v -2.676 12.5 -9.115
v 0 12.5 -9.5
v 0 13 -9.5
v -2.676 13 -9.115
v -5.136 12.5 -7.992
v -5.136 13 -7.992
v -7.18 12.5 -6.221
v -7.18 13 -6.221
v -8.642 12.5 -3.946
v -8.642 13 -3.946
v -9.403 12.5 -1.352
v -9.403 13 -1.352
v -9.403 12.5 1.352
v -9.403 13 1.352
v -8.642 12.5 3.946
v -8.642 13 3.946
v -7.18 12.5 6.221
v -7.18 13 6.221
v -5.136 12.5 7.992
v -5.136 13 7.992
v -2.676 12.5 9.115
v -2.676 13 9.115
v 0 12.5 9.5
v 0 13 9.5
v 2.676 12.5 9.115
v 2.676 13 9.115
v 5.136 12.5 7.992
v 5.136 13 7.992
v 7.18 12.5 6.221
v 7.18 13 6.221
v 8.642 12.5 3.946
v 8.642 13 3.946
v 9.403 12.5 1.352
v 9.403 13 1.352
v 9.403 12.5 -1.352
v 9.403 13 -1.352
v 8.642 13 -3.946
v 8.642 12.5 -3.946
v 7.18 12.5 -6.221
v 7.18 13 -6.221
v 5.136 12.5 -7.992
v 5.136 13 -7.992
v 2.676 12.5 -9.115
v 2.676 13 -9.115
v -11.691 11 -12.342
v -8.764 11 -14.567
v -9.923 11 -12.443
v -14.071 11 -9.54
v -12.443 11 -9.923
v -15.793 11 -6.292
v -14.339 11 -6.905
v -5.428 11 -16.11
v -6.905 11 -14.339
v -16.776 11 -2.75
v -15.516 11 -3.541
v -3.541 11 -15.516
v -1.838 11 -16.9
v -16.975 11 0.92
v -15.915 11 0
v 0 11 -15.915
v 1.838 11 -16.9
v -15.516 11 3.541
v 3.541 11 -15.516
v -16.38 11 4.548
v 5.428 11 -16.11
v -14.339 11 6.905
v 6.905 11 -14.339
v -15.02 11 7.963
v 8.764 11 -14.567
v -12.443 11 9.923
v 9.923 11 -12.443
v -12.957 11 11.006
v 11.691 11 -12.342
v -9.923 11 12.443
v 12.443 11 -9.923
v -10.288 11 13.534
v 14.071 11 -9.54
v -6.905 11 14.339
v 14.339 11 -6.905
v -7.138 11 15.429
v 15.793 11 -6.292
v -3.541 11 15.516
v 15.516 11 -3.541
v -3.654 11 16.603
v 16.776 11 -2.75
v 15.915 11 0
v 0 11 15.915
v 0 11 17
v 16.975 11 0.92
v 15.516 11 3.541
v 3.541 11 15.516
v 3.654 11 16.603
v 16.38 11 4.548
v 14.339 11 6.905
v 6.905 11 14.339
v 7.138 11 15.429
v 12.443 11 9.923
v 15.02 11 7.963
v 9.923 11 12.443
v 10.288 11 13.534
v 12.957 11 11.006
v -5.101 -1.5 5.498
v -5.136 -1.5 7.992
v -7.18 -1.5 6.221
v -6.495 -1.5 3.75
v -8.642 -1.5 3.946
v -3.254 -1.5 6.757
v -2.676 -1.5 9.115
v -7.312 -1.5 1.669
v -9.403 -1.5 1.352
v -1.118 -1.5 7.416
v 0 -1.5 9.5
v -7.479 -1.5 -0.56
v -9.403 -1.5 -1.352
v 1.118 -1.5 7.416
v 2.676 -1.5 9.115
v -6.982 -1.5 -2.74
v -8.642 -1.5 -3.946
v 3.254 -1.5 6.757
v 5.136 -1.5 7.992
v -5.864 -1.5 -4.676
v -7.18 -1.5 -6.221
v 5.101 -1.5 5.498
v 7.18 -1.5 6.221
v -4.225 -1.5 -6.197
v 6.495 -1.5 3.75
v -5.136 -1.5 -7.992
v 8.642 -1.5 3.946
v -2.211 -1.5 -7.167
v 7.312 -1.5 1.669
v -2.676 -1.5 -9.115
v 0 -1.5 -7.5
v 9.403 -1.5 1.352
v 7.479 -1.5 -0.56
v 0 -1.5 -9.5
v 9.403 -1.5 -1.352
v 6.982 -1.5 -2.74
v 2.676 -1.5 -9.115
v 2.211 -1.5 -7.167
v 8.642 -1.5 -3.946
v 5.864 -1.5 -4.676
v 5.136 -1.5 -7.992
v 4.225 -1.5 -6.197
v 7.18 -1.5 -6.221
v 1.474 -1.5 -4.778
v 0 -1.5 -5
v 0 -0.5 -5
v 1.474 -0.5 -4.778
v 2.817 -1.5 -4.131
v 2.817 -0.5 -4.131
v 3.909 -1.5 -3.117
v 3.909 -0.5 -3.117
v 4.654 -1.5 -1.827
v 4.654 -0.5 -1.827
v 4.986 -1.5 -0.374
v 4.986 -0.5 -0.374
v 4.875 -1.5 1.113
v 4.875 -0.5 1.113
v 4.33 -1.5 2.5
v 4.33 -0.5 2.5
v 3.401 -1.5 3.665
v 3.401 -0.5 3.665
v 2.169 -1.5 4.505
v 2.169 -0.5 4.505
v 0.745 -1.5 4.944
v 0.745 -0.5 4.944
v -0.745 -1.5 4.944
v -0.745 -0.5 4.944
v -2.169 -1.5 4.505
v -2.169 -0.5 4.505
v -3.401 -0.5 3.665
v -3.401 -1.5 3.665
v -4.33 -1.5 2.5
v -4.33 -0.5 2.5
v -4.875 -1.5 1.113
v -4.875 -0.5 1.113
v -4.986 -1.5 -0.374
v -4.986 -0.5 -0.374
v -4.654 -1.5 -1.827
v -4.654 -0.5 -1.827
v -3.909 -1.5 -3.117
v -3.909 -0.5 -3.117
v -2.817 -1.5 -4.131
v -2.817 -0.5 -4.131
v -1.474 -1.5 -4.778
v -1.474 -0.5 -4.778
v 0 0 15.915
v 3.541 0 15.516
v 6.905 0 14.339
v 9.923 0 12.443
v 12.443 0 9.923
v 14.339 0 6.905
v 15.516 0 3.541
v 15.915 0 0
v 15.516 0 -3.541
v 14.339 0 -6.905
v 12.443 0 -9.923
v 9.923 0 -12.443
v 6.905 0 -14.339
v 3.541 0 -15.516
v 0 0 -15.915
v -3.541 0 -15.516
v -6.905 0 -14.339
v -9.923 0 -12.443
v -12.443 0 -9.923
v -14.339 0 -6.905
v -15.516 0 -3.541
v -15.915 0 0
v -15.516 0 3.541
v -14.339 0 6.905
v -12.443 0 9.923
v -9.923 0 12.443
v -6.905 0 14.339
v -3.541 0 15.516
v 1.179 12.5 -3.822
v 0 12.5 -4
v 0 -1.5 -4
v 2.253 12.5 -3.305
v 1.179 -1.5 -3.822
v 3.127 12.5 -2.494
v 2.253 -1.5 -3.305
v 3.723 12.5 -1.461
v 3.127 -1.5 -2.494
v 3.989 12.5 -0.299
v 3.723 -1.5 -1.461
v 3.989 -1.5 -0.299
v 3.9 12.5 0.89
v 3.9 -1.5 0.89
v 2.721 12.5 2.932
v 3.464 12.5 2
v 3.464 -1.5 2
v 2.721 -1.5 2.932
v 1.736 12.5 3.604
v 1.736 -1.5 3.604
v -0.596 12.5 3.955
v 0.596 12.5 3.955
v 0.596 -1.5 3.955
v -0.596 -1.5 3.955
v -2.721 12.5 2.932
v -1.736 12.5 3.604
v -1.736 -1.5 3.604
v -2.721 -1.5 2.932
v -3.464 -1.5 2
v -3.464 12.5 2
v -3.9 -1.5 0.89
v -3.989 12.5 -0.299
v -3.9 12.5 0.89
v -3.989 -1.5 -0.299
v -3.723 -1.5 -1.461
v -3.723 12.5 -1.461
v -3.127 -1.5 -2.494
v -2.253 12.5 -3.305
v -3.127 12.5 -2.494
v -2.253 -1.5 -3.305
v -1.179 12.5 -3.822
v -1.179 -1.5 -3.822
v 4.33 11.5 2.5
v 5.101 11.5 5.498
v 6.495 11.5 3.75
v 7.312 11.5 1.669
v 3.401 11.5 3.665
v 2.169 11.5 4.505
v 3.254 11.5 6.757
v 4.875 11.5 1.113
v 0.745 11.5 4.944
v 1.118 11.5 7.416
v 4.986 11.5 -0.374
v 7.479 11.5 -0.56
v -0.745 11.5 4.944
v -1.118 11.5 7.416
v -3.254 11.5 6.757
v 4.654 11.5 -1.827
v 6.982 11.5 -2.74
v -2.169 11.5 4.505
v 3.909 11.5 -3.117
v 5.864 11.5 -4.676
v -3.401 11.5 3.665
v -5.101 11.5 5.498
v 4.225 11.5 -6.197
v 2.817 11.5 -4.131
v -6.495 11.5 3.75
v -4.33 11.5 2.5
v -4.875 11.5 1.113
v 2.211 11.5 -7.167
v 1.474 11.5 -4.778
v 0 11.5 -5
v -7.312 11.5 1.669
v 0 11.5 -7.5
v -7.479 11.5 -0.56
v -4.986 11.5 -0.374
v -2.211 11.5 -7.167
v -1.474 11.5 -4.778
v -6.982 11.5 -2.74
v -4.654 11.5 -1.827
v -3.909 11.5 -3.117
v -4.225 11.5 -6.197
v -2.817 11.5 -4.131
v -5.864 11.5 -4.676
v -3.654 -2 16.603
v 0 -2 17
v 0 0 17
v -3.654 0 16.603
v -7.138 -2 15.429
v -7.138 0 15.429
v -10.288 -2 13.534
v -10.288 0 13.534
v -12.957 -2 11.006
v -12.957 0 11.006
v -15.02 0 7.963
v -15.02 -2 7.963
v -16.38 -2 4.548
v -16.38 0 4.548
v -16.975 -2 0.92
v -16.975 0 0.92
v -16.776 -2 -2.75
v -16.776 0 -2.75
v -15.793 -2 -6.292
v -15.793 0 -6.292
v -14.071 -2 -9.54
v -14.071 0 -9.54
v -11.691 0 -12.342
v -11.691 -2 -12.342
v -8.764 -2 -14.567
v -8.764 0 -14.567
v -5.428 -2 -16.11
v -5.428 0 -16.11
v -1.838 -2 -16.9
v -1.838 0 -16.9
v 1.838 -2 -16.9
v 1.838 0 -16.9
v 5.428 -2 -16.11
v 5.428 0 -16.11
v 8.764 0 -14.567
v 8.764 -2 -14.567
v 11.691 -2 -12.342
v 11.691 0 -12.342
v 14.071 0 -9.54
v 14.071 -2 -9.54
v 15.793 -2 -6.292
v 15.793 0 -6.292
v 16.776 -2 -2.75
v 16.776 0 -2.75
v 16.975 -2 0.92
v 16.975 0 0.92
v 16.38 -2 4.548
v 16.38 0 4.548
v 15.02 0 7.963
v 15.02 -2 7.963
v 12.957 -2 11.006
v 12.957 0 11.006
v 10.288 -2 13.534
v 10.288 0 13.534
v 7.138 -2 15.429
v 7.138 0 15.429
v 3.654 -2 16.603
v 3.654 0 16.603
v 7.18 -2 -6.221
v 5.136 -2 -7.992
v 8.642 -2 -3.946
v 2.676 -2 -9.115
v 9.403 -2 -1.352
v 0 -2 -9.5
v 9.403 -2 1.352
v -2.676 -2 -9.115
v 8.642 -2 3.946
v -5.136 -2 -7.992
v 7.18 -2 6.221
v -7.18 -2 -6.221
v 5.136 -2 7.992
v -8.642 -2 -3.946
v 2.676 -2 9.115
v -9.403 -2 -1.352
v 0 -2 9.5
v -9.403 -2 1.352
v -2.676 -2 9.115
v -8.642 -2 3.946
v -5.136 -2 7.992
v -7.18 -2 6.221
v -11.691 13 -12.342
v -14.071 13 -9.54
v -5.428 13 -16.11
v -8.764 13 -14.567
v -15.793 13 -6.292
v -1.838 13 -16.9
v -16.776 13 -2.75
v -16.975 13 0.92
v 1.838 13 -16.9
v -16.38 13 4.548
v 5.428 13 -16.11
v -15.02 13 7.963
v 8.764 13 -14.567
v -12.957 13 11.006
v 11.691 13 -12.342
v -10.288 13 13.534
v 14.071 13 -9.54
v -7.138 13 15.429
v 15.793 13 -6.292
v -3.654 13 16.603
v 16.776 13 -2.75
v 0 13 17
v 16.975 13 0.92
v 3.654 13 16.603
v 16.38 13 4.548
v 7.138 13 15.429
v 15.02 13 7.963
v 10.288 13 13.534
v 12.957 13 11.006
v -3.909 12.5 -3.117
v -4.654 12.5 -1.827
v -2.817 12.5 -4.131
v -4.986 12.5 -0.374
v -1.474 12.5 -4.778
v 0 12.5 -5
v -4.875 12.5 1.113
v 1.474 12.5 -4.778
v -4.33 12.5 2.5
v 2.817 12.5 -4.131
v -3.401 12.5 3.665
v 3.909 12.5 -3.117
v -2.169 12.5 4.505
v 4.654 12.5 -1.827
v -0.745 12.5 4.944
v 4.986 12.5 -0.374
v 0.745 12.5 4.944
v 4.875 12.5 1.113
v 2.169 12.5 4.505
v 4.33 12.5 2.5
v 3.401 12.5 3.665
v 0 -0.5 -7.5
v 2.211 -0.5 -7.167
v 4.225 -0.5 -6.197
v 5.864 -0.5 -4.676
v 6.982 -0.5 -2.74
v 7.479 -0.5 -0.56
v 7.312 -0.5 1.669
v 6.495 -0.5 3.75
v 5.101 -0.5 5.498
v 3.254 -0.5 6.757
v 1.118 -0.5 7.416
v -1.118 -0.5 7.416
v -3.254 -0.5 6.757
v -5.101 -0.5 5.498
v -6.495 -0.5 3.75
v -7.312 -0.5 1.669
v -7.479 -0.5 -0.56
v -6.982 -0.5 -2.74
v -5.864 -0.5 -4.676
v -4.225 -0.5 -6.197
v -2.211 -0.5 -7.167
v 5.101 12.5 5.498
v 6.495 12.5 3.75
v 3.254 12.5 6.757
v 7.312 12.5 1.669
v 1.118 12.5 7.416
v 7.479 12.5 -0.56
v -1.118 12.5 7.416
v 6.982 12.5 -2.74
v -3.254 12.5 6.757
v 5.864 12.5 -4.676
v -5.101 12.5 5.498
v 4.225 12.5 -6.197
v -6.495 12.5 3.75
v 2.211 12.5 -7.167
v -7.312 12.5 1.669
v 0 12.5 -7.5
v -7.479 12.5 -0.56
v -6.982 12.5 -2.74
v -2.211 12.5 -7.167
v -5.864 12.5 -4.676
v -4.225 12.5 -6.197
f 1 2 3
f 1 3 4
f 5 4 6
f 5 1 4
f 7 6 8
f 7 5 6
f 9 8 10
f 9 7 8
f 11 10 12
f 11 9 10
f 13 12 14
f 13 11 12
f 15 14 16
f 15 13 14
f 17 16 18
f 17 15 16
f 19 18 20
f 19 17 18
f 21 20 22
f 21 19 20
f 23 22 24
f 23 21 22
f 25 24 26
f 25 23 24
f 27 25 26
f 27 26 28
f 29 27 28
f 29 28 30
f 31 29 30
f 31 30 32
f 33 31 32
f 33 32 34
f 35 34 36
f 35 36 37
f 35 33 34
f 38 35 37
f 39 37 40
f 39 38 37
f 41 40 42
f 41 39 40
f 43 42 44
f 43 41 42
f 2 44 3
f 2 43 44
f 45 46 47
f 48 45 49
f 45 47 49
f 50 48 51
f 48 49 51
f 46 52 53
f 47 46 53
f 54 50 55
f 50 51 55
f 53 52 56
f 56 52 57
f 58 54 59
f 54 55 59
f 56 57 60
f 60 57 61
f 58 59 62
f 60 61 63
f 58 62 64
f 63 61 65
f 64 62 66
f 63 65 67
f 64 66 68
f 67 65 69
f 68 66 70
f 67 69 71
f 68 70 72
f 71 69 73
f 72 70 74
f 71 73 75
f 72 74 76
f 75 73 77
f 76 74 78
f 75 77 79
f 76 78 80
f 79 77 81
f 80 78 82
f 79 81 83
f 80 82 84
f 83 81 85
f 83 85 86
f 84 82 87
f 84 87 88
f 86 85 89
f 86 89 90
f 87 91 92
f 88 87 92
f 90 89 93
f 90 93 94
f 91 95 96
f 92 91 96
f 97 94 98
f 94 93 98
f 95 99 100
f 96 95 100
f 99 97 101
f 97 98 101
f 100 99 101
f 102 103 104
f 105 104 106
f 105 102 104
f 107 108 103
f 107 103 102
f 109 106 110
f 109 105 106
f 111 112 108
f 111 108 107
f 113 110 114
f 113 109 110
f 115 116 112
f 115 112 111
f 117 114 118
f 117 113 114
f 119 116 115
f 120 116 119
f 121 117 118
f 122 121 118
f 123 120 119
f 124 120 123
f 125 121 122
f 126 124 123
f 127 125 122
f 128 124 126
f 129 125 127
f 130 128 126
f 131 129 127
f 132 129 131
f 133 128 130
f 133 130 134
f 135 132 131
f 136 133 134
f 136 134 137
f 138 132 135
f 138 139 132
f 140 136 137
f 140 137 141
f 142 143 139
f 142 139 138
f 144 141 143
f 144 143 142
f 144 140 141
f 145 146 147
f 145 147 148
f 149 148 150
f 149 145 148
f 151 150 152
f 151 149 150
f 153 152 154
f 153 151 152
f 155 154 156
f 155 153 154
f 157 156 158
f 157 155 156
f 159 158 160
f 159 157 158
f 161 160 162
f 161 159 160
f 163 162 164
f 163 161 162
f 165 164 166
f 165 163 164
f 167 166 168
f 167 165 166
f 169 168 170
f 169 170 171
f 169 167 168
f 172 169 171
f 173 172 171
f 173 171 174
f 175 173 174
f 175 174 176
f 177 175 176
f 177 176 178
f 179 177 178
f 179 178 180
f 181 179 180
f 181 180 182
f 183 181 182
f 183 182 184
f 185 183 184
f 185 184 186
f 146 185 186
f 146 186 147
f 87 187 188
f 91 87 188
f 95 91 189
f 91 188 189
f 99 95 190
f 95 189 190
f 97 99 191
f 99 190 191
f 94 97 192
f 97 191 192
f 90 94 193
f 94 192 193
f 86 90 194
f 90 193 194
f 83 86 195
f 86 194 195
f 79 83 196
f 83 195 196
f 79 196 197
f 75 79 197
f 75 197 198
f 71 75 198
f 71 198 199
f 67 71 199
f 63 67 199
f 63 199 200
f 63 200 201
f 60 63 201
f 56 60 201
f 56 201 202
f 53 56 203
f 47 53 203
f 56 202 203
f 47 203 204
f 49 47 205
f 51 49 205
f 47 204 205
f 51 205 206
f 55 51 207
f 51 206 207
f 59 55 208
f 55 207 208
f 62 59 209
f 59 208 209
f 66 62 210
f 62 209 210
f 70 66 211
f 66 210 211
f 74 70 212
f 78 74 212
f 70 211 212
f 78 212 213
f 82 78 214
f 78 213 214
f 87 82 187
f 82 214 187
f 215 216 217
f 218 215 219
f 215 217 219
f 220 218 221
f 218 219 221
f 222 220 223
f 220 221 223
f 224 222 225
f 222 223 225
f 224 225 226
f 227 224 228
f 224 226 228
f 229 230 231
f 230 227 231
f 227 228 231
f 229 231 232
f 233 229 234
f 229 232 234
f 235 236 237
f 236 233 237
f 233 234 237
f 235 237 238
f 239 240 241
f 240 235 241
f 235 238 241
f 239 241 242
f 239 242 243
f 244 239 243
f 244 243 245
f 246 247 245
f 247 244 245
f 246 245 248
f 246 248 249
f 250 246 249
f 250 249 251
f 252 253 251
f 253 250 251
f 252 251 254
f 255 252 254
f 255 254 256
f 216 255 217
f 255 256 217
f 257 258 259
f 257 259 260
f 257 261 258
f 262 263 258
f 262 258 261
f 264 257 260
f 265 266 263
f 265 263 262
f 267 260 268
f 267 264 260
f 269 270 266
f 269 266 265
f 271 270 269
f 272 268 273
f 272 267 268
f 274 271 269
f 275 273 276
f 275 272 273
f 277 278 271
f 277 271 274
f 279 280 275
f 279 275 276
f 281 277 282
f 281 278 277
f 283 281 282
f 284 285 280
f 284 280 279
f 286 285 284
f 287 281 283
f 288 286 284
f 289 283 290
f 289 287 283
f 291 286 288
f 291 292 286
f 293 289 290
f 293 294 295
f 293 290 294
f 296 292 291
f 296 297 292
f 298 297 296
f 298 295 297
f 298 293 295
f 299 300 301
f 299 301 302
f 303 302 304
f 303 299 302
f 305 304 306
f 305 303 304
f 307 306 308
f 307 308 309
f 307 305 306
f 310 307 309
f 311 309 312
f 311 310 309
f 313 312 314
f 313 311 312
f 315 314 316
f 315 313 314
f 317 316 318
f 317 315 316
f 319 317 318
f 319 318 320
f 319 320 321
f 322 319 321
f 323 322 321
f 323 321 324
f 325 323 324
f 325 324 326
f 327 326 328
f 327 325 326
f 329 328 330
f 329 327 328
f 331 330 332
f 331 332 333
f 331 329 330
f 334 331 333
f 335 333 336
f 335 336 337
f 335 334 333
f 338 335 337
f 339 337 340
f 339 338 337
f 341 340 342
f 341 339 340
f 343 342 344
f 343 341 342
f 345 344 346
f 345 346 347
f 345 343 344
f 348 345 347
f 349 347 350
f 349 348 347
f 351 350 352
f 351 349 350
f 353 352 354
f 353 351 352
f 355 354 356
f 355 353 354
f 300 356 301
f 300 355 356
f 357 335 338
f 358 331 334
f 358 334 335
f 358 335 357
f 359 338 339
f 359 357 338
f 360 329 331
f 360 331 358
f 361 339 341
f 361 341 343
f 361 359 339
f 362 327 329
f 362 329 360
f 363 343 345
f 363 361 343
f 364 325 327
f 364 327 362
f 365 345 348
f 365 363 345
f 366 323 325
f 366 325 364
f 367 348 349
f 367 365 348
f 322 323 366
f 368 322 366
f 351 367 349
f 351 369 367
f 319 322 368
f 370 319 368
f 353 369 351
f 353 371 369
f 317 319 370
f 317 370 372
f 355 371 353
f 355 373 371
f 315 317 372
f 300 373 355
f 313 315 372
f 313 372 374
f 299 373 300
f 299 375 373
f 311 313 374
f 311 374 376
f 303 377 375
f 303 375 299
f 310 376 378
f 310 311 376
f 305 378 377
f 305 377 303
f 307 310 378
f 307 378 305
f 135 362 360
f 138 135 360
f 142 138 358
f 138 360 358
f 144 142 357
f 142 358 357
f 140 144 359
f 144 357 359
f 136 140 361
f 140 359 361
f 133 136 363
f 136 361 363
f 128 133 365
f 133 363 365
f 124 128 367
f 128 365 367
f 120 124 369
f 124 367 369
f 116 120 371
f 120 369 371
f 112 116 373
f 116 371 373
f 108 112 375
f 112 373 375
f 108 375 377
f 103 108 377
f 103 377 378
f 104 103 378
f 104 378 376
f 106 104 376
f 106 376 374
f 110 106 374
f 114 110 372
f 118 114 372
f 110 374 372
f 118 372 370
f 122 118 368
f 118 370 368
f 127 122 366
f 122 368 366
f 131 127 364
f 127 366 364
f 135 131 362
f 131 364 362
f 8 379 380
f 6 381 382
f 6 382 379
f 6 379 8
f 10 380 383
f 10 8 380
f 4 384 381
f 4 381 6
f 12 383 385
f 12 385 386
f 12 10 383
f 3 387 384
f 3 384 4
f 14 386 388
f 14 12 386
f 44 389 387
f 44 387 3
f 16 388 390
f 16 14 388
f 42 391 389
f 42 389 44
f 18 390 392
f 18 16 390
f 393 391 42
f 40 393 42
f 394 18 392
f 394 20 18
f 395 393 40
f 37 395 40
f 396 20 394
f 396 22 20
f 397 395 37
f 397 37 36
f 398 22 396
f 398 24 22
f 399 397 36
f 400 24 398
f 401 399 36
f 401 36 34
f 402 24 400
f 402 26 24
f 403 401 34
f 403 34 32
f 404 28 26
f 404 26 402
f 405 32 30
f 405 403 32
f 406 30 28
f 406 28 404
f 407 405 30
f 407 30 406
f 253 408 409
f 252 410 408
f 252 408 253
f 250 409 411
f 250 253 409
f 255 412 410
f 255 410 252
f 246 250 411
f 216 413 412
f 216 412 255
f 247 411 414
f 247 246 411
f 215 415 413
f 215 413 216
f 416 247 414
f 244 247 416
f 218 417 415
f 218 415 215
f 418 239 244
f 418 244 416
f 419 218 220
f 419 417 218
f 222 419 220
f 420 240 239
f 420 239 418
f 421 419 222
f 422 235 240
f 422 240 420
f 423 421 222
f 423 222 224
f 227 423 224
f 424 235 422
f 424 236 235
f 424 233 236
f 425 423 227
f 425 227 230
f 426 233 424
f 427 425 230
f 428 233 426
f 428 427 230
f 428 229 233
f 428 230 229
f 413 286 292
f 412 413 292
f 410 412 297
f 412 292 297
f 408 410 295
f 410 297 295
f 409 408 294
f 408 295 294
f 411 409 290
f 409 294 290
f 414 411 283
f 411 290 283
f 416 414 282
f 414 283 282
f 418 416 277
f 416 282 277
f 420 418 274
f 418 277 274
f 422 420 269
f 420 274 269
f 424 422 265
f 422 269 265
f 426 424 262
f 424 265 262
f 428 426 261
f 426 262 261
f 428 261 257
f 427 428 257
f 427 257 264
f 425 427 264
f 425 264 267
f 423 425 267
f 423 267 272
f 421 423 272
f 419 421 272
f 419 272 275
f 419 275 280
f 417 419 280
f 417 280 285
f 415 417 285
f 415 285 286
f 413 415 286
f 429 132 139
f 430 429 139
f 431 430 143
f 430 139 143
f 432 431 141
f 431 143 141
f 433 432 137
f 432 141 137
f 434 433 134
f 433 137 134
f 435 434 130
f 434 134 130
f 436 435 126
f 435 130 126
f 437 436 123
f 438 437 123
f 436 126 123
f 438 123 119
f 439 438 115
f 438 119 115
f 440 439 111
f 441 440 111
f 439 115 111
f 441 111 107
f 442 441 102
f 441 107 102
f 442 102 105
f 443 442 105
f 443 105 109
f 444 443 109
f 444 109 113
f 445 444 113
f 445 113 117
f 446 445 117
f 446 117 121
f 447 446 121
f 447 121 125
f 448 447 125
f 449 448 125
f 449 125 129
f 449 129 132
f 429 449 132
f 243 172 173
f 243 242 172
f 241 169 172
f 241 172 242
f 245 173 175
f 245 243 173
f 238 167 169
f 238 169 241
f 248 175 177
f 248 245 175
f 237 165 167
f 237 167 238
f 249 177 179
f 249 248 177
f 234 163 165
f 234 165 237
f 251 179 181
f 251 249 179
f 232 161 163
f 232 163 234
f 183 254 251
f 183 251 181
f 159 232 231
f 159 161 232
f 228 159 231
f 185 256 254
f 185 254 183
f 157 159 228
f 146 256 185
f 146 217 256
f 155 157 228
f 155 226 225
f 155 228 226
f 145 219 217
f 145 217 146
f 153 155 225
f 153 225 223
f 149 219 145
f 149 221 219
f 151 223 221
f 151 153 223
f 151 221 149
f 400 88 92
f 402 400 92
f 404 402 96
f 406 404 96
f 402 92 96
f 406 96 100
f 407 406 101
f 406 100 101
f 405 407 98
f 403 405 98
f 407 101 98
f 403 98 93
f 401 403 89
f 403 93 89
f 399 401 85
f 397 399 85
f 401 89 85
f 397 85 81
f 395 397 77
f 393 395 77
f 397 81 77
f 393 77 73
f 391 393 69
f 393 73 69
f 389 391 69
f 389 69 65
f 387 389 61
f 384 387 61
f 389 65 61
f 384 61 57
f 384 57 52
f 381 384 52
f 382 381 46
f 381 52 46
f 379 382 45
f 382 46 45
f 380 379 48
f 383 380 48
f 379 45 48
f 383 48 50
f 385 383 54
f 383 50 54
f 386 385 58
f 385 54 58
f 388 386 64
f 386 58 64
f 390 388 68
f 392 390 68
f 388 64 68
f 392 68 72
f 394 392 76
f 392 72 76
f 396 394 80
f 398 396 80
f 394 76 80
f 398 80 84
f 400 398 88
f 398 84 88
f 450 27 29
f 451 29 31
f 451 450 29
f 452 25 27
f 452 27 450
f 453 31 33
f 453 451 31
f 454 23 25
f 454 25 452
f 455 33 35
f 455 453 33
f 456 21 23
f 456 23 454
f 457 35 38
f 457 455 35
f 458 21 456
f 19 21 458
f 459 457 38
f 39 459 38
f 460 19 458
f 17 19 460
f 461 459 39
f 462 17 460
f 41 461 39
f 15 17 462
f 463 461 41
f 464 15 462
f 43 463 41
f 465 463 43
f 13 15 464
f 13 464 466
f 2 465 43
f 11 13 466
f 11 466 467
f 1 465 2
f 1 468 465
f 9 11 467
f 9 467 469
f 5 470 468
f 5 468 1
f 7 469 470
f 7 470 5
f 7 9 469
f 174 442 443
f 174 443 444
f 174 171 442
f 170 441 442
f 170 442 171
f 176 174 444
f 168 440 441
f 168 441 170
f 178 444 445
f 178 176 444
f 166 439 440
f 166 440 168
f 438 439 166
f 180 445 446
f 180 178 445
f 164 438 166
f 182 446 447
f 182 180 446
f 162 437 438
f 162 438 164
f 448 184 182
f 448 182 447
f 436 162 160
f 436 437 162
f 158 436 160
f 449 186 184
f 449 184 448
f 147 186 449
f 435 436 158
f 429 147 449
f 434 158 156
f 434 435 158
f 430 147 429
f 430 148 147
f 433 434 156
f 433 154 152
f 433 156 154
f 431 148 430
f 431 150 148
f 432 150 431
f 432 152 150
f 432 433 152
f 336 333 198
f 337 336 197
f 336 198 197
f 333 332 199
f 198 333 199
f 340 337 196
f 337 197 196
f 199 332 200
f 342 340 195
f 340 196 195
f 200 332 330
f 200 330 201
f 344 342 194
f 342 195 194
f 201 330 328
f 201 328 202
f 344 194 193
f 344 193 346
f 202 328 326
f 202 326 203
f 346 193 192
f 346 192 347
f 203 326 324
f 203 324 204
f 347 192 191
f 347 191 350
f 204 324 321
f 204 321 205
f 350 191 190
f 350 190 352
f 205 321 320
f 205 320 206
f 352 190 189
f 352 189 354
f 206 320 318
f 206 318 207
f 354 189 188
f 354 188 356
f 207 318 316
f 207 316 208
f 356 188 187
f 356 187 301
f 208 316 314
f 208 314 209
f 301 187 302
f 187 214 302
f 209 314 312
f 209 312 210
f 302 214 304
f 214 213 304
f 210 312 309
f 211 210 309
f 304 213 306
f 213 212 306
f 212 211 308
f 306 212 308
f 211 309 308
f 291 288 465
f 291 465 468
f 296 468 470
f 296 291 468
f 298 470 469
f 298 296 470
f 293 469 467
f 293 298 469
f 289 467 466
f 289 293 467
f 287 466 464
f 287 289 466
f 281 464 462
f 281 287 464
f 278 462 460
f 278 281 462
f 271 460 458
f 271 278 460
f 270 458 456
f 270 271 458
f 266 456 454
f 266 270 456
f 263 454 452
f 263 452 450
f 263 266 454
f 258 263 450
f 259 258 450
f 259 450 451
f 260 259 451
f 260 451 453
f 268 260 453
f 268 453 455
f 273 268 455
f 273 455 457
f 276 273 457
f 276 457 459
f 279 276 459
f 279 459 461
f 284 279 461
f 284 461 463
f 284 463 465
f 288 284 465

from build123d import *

# Parameters (mm, degrees)
SKETCH_1_R          = 15.915
EXTRUDE_1_DEPTH     = 11
SKETCH_2_R          = 17
EXTRUDE_2_DEPTH     = 2
EXTRUDE_START       = 2
SKETCH_3_R          = 17
EXTRUDE_3_DEPTH     = 2
SKETCH_4_R          = 9.5
SKETCH_4_R_2        = 7.5
CUT_EXTRUDE_1_DEPTH = 0.5
SKETCH_4_3_R        = 7.5
SKETCH_4_3_R_2      = 5
CUT_EXTRUDE_2_DEPTH = 1.5
SKETCH_4_4_R        = 5
SKETCH_4_4_R_2      = 4
CUT_EXTRUDE_3_DEPTH = 0.5
SKETCH_4_5_R        = 4
CUT_EXTRUDE_4_DEPTH = 29.337254631
CUT_EXTRUDE_START   = -0.5
SKETCH_6_R          = 9.5
SKETCH_6_R_2        = 7.5
CUT_EXTRUDE_5_DEPTH = 0.5
CUT_EXTRUDE_START_2 = -1.5
SKETCH_6_3_R        = 7.5
SKETCH_6_3_R_2      = 5
CUT_EXTRUDE_6_DEPTH = 1.5
SKETCH_6_5_R        = 5
SKETCH_6_5_R_2      = 4
CUT_EXTRUDE_7_DEPTH = 0.5


with BuildPart() as part:
    # 草图1 → 凸台-拉伸1 (new body)
    with BuildSketch(Plane(origin=(0, 0, 0), x_dir=(1, 0, 0), z_dir=(0, 1, 0))):
        Circle(SKETCH_1_R)
    extrude(amount=EXTRUDE_1_DEPTH)

    # 草图2 → 凸台-拉伸2 (add)
    with BuildSketch(Plane(origin=(0, 11, 0), x_dir=(1, 0, 0), z_dir=(0, 1, 0))):
        Circle(SKETCH_2_R)
    extrude(amount=EXTRUDE_2_DEPTH)

    # 草图3 → 凸台-拉伸3 (add)
    with BuildSketch(Plane.XZ.offset(EXTRUDE_START)):
        Circle(SKETCH_3_R)
    extrude(amount=-EXTRUDE_3_DEPTH)

    # 草图4 → 切除-拉伸1 (cut)
    with BuildSketch(Plane.XZ.offset(2)):
        Circle(SKETCH_4_R)
        Circle(SKETCH_4_R_2, mode=Mode.SUBTRACT)
    extrude(amount=-CUT_EXTRUDE_1_DEPTH, mode=Mode.SUBTRACT)

    # 草图4<3> → 切除-拉伸2 (cut)
    with BuildSketch(Plane.XZ.offset(2)):
        Circle(SKETCH_4_3_R)
        Circle(SKETCH_4_3_R_2, mode=Mode.SUBTRACT)
    extrude(amount=-CUT_EXTRUDE_2_DEPTH, mode=Mode.SUBTRACT)

    # 草图4<4> → 切除-拉伸3 (cut)
    with BuildSketch(Plane.XZ.offset(2)):
        Circle(SKETCH_4_4_R)
        Circle(SKETCH_4_4_R_2, mode=Mode.SUBTRACT)
    extrude(amount=-CUT_EXTRUDE_3_DEPTH, mode=Mode.SUBTRACT)

    # 草图4<5> → 切除-拉伸4 (cut, through all)
    with BuildSketch(Plane.XZ.offset(2)):
        Circle(SKETCH_4_5_R)
    extrude(amount=-CUT_EXTRUDE_4_DEPTH, mode=Mode.SUBTRACT)

    # 草图6 → 切除-拉伸5 (cut)
    with BuildSketch(Plane(origin=(0, 13, 0), x_dir=(1, 0, 0), z_dir=(0, 1, 0)).offset(CUT_EXTRUDE_START)):
        Circle(SKETCH_6_R)
        Circle(SKETCH_6_R_2, mode=Mode.SUBTRACT)
    extrude(amount=CUT_EXTRUDE_5_DEPTH, mode=Mode.SUBTRACT)

    # 草图6<3> → 切除-拉伸6 (cut)
    with BuildSketch(Plane(origin=(0, 13, 0), x_dir=(1, 0, 0), z_dir=(0, 1, 0)).offset(CUT_EXTRUDE_START_2)):
        Circle(SKETCH_6_3_R)
        Circle(SKETCH_6_3_R_2, mode=Mode.SUBTRACT)
    extrude(amount=CUT_EXTRUDE_6_DEPTH, mode=Mode.SUBTRACT)

    # 草图6<5> → 切除-拉伸7 (cut)
    with BuildSketch(Plane(origin=(0, 13, 0), x_dir=(1, 0, 0), z_dir=(0, 1, 0)).offset(CUT_EXTRUDE_START)):
        Circle(SKETCH_6_5_R)
        Circle(SKETCH_6_5_R_2, mode=Mode.SUBTRACT)
    extrude(amount=CUT_EXTRUDE_7_DEPTH, mode=Mode.SUBTRACT)


solid = part.part
